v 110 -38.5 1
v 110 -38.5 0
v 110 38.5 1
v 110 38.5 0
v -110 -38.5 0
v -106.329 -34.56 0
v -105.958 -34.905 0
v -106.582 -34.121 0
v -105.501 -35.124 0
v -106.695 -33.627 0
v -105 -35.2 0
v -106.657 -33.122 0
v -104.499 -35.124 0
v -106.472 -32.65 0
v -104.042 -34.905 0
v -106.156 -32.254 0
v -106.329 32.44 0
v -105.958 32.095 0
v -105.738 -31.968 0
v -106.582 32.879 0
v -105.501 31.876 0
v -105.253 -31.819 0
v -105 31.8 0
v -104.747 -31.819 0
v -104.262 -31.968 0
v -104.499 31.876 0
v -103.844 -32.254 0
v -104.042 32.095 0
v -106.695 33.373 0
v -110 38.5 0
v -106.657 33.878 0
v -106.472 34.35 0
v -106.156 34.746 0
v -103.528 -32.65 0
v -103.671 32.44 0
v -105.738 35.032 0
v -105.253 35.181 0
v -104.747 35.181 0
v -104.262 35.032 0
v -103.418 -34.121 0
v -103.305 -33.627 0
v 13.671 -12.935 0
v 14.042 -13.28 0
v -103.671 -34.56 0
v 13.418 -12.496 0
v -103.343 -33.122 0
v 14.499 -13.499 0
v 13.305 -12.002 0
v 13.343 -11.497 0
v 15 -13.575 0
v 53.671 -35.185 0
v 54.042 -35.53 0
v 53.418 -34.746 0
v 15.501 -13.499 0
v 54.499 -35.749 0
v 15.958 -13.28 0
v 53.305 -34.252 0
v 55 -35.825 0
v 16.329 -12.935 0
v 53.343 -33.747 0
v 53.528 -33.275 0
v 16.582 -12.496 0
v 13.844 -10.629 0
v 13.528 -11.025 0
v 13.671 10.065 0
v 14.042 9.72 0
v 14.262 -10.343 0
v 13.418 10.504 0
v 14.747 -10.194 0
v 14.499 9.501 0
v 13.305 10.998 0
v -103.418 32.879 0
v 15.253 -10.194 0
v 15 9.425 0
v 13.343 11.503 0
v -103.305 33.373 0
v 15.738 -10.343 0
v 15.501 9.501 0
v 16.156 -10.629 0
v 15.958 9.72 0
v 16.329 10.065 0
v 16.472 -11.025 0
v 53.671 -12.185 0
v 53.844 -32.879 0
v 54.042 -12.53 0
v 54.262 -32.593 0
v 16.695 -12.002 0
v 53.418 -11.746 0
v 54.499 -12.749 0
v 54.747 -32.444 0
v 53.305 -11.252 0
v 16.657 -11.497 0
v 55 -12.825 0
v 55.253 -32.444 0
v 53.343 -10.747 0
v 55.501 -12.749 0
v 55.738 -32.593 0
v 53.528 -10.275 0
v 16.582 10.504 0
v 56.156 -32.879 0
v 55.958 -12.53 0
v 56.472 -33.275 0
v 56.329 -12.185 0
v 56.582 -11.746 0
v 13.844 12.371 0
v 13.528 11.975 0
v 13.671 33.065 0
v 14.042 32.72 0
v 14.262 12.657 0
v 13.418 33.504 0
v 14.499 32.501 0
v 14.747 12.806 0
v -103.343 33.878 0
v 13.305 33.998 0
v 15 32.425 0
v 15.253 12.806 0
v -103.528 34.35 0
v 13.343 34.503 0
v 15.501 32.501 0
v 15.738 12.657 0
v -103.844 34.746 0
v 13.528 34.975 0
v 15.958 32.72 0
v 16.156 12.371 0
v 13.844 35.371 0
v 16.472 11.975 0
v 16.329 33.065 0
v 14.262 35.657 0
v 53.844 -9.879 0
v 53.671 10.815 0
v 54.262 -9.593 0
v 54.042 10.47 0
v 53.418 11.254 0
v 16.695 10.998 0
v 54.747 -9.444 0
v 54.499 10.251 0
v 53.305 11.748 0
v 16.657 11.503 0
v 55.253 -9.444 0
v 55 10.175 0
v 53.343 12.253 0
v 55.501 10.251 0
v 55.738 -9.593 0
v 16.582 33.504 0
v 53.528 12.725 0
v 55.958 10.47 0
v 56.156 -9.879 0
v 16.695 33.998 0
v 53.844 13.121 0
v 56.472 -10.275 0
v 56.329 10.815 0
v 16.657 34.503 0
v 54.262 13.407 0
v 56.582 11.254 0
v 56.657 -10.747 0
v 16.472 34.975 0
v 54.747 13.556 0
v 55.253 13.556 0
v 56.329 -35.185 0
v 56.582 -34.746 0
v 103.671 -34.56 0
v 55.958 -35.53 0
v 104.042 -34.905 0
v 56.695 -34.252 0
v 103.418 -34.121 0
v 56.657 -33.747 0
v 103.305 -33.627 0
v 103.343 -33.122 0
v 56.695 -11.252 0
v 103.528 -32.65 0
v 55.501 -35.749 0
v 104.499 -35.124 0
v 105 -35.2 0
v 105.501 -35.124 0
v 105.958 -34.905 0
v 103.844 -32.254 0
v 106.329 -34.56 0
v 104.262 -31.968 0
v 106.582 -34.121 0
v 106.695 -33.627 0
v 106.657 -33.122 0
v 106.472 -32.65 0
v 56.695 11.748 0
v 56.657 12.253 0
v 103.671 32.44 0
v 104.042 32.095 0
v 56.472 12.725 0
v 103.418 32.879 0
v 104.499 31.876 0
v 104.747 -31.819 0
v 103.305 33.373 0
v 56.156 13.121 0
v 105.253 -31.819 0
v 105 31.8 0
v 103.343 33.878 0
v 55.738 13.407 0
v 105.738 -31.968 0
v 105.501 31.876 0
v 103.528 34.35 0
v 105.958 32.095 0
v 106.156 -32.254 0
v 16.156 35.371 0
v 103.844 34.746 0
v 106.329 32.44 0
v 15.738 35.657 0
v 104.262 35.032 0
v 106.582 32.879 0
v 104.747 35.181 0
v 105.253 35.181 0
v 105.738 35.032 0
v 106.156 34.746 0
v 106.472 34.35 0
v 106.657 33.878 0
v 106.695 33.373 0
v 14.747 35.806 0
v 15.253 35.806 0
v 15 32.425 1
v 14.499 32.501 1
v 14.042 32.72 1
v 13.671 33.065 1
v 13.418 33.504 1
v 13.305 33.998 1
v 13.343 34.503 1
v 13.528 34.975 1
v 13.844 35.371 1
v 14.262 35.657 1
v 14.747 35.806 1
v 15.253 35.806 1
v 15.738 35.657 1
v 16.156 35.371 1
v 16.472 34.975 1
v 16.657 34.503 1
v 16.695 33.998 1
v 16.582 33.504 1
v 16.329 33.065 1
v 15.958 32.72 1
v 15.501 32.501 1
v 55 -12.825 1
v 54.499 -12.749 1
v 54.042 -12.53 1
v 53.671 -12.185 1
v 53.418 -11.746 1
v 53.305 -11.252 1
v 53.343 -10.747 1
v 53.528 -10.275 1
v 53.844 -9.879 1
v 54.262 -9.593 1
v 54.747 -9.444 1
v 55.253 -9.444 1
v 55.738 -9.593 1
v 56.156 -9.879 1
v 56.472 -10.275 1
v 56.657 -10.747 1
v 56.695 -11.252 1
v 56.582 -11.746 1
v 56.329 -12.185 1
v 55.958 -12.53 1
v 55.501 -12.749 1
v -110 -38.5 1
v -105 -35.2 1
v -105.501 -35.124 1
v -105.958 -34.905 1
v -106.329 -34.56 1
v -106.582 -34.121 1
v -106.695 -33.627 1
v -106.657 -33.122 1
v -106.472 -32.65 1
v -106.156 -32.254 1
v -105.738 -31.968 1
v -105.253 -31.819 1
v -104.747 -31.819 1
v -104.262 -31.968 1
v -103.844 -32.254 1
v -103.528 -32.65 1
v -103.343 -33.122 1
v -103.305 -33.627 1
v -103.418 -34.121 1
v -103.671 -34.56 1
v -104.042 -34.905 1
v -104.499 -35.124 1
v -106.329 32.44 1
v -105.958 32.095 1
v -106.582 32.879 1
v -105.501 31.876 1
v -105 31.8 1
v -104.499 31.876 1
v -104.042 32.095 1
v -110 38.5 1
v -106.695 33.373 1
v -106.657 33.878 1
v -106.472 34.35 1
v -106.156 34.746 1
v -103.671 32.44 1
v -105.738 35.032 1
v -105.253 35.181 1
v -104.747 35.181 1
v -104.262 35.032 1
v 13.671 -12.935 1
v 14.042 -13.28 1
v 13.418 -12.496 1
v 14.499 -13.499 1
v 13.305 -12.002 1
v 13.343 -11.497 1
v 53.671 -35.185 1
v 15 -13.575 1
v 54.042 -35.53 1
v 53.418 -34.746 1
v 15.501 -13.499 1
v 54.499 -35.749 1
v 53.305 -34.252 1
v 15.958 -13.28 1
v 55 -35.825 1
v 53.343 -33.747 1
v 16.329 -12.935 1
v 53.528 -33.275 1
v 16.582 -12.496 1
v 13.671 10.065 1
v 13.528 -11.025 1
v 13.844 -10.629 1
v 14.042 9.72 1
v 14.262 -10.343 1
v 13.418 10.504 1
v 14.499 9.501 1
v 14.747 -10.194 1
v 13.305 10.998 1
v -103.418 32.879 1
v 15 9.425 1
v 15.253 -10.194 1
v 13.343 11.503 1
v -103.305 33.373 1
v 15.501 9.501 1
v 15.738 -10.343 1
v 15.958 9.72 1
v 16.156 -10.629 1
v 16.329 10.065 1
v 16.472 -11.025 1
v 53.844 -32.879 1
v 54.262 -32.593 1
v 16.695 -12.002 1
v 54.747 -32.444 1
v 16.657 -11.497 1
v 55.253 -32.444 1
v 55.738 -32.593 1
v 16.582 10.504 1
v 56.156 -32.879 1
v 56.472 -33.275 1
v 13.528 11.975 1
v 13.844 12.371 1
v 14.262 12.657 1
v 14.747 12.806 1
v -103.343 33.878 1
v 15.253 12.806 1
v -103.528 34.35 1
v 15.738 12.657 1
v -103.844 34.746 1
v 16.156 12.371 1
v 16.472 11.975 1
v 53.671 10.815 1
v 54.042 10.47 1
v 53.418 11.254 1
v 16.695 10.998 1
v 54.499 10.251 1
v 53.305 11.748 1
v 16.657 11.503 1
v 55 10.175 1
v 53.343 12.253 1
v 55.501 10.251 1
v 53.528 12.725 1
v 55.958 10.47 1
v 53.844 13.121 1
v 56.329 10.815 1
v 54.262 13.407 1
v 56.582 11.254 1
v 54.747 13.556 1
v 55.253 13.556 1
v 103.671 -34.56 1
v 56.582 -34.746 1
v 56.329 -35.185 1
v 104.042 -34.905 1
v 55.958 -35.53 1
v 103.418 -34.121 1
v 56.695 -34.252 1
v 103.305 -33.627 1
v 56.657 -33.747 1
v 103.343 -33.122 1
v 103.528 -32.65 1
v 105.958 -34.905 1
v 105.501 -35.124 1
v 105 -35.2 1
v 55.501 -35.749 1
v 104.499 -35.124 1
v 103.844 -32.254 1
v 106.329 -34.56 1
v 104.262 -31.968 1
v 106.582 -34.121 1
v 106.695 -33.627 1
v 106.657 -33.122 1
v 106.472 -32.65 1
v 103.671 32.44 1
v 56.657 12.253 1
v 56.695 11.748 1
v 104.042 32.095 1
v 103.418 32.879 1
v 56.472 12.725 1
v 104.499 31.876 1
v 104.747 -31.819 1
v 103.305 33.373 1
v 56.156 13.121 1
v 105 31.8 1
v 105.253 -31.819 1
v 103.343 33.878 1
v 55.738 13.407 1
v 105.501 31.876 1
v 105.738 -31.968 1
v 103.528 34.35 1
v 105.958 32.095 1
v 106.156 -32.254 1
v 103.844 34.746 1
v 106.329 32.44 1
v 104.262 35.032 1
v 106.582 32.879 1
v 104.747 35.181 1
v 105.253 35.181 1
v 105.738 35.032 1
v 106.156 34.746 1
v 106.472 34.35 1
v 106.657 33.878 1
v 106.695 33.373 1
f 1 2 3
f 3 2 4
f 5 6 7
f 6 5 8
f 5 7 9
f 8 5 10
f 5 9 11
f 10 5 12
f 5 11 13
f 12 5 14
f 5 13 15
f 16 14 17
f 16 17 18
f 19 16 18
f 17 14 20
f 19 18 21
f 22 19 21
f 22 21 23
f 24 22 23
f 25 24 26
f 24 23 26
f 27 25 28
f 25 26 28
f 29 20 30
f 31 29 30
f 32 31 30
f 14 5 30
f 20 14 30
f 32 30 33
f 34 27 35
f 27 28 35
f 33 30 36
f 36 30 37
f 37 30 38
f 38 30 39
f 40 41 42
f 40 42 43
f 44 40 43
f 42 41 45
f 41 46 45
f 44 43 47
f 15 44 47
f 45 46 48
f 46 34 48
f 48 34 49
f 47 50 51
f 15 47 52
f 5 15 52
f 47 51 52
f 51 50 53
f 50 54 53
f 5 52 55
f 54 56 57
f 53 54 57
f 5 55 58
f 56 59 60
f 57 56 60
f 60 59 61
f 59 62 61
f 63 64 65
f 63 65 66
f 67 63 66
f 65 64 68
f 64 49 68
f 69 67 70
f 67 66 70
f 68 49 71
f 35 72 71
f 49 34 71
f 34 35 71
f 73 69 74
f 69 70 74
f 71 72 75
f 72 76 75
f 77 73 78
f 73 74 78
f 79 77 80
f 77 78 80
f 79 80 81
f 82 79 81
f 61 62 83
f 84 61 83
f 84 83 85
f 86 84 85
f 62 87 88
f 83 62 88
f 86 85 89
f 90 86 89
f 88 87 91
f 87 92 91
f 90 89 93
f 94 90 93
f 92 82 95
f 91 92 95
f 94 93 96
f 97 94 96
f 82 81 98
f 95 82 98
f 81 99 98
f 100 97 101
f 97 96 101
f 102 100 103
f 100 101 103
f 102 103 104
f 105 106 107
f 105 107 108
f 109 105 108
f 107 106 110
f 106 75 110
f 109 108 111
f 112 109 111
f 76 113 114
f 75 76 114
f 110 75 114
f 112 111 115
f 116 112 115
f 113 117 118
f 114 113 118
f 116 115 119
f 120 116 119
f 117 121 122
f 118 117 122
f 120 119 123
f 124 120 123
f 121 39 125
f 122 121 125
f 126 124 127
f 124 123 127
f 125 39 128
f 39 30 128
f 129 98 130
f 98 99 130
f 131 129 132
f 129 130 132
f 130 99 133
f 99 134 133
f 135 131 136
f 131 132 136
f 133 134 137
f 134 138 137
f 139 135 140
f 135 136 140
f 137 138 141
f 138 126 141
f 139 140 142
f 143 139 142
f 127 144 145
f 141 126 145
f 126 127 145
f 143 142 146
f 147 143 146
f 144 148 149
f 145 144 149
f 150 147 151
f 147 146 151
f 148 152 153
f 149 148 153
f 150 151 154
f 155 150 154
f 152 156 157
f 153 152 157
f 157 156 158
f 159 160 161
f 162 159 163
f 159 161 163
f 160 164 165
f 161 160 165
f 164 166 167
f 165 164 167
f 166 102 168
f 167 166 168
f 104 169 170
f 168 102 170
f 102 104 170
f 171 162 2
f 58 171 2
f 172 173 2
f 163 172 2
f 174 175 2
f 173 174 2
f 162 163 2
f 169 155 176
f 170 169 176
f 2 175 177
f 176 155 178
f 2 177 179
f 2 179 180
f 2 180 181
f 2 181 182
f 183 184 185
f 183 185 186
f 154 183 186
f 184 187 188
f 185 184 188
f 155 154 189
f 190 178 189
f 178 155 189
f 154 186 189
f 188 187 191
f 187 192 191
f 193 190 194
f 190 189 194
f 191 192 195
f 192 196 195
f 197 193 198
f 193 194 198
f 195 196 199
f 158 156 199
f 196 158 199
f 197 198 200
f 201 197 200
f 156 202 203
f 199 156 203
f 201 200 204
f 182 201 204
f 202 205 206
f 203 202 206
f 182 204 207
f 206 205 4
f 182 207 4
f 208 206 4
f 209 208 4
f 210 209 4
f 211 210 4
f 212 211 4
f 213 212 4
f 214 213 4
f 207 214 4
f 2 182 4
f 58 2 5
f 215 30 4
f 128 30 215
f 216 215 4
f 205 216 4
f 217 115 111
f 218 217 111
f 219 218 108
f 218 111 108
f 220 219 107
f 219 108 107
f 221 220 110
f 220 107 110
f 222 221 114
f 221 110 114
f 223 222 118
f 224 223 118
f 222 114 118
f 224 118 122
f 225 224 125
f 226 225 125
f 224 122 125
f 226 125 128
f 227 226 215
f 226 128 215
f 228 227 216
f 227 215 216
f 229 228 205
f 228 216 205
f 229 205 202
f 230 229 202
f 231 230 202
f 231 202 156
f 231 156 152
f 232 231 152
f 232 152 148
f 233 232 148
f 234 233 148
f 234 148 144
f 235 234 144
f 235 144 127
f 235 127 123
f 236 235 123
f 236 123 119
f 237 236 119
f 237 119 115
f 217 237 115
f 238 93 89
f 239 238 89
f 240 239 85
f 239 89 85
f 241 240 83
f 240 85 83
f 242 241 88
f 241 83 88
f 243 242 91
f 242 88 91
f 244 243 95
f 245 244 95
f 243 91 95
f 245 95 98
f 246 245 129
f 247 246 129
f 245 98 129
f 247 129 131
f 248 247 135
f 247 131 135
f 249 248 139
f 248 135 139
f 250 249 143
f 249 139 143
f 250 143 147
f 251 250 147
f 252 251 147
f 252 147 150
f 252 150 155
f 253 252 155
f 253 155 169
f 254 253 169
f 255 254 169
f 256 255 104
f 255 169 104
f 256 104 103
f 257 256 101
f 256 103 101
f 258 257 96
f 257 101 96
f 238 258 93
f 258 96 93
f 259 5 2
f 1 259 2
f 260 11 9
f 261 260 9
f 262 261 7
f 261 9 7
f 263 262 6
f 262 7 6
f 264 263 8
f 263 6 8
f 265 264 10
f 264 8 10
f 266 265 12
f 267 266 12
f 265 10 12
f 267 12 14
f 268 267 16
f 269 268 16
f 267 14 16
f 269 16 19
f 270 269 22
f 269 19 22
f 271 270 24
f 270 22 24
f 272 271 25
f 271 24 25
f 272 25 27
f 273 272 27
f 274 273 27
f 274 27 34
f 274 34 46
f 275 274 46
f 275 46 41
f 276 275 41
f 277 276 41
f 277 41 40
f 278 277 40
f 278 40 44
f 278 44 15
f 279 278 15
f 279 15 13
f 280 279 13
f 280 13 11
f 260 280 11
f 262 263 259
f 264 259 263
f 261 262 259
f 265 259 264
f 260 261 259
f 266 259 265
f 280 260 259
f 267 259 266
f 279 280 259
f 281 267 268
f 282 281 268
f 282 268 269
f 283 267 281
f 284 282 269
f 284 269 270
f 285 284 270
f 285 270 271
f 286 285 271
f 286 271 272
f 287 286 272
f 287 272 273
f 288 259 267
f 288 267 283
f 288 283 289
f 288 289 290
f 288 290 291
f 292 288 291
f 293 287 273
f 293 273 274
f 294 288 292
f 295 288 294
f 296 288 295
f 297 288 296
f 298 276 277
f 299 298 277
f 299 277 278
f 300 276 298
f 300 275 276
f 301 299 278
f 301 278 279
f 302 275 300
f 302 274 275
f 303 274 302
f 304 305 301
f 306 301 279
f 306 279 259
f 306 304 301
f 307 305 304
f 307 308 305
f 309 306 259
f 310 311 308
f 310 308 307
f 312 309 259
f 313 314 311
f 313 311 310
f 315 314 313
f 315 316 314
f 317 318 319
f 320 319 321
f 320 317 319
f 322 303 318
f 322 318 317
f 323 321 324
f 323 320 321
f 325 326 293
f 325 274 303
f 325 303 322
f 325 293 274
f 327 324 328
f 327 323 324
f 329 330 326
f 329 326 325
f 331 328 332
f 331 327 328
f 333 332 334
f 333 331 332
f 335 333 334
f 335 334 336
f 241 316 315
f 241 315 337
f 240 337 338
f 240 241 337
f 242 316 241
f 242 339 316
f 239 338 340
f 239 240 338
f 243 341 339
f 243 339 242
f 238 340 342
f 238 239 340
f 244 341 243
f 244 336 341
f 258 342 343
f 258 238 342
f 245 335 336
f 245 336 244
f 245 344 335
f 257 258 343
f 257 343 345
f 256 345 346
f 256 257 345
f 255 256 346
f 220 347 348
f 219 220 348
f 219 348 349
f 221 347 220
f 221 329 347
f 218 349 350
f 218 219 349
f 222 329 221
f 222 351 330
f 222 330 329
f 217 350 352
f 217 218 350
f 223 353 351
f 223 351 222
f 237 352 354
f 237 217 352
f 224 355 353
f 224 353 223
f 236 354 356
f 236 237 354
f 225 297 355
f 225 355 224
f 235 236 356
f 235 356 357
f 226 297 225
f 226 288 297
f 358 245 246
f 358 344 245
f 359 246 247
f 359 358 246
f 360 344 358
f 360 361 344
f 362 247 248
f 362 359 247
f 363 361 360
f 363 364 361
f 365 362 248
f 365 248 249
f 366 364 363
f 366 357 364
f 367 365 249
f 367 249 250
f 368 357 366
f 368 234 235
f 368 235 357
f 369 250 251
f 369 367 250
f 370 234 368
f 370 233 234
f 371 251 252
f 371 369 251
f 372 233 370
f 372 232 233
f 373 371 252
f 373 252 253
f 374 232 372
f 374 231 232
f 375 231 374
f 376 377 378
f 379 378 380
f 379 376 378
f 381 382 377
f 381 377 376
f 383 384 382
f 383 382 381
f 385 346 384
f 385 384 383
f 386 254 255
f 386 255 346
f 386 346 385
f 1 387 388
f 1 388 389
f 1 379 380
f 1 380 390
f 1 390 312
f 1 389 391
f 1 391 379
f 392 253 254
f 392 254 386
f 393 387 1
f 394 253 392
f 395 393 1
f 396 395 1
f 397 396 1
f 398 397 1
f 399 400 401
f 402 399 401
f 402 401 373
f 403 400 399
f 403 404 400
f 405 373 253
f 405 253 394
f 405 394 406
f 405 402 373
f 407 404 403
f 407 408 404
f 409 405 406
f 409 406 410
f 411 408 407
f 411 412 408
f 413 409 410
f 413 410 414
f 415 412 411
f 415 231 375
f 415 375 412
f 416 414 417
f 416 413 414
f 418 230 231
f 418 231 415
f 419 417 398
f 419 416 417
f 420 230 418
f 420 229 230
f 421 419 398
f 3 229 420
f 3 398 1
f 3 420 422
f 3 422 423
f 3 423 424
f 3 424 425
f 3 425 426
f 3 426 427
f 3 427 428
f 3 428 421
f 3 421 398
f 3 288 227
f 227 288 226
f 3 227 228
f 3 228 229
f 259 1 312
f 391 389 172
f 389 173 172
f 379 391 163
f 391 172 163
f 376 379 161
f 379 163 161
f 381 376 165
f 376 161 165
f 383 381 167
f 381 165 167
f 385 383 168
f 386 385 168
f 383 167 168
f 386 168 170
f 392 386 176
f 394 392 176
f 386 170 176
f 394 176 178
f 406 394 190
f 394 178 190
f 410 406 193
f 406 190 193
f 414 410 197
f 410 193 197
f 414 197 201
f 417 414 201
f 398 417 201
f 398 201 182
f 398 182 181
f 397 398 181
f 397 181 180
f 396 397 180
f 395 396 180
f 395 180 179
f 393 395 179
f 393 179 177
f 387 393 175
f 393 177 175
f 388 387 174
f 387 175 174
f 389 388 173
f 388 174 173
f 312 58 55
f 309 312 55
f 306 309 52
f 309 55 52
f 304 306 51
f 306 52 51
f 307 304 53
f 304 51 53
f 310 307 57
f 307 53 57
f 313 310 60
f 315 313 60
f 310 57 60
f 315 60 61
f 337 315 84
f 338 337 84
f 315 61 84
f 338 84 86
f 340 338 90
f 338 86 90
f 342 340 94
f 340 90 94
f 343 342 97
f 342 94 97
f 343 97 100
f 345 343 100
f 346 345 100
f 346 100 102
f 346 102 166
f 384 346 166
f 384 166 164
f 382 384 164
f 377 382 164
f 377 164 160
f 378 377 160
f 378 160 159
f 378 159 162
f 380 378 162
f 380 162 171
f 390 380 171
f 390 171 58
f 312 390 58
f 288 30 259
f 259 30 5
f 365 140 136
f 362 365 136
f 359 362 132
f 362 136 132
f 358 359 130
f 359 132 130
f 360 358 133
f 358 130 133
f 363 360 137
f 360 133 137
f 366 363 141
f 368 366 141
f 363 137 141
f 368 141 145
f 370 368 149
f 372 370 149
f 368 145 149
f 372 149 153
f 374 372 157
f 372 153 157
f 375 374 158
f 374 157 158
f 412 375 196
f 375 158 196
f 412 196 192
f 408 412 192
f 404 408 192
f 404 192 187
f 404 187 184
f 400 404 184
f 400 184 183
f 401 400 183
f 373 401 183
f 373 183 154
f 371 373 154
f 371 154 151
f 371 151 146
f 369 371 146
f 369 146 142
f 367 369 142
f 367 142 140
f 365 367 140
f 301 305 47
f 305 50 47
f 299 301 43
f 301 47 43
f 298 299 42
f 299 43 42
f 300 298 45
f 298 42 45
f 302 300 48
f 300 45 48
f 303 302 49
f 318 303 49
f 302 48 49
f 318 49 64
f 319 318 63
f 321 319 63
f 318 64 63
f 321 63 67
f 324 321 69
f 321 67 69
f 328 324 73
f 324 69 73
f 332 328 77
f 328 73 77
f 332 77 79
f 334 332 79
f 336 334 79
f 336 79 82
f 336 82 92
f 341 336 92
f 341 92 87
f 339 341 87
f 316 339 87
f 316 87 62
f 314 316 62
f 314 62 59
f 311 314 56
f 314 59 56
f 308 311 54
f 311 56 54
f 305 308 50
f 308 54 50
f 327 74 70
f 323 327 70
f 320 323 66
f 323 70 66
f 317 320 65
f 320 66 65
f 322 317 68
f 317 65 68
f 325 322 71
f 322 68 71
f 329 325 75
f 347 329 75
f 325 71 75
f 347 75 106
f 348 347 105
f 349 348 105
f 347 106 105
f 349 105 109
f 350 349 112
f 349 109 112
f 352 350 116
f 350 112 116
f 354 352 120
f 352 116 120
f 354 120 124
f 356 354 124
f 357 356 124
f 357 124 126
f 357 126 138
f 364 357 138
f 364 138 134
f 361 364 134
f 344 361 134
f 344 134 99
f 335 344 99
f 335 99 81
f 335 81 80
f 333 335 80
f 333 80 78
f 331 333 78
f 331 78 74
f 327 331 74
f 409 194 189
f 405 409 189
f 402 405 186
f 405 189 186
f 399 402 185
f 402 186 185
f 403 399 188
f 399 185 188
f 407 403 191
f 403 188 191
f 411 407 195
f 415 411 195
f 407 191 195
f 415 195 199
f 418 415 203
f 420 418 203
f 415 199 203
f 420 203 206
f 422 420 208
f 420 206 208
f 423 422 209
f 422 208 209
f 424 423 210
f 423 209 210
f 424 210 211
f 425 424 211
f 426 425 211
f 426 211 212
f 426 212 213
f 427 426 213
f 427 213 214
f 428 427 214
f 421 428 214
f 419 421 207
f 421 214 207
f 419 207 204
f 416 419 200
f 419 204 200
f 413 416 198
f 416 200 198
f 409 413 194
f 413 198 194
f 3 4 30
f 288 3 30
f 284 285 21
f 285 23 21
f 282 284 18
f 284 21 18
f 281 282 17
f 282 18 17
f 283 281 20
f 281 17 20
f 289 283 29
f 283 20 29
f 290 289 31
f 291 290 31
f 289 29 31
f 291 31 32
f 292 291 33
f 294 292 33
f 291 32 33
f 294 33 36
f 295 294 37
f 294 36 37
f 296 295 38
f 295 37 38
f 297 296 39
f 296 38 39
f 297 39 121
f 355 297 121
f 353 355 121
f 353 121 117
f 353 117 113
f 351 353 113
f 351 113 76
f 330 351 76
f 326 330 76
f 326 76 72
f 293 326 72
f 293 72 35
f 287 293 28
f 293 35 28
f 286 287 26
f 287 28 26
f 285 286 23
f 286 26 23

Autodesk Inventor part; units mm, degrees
ref_plane "YZ Plane" through (0, 0, 0) normal (1, 0, 0) x (0, 1, 0)
ref_plane "XZ Plane" through (0, 0, 0) normal (0, 1, 0) x (-1, 0, 0)
ref_plane "XY Plane" through (0, 0, 0) normal (0, 0, 1) x (1, 0, 0)
sketch "スケッチ1" plane through (0, 0, 0) normal (0, 0, 1) x (1, 0, 0)
  line L0 (-110, -38.5) -> (110, -38.5)
  line L1 (110, -38.5) -> (110, 38.5)
  line L2 (110, 38.5) -> (-110, 38.5)
  line L3 (-110, 38.5) -> (-110, -38.5)
  line L4 (-110, -38.5) -> (110, 38.5) construction
  line L5 (110, -38.5) -> (-110, 38.5) construction
  point P0 (0, 0)
  dimension "d0" = 220
  dimension "d1" = 77
extrude "プレート1" add sketch "スケッチ1" along normal blind 1
sketch "スケッチ2" plane through (0, 0, 1) normal (0, 0, 1) x (1, 0, 0)
  line L0 (-110, -38.5) -> (-110, 38.5) projected
  line L1 (110, -38.5) -> (-110, -38.5) projected
  line L2 (110, 38.5) -> (110, -38.5) projected
  line L3 (-110, 38.5) -> (110, 38.5) projected
  line L4 (105, 33.5) -> (105, -33.5)
  line L5 (105, -33.5) -> (-105, -33.5)
  line L6 (-105, -33.5) -> (-105, 33.5)
  line L7 (-105, 33.5) -> (105, 33.5)
  point P0 (0, 0)
  dimension "d3" = 5
hole "穴1" at (-105, 33.5, 1) at (-105, -33.5, 1) at (105, -33.5, 1) at (105, 33.5, 1) direction (0, 0, -1) diameter 3.4 depth 1 clearance for "Flat Head Machine Screw" size "M3" standard "Ansi Metric M Profile"
sketch "スケッチ3" plane through (0, 0, 1) normal (0, 0, 1) x (1, 0, 0)
  line L0 (55, -34.125) -> (15, -34.125)
  line L1 (15, -34.125) -> (15, -11.875)
  line L2 (15, -11.875) -> (55, -11.875)
  line L3 (55, -11.875) -> (55, -34.125)
  line L4 (55, -34.125) -> (15, -11.875) construction
  line L5 (15, -34.125) -> (55, -11.875) construction
  line L6 (15, 11.125) -> (55, 11.125)
  line L7 (55, 11.125) -> (55, -11.125)
  line L8 (55, -11.125) -> (15, -11.125)
  line L9 (15, -11.125) -> (15, 11.125)
  line L10 (15, 11.125) -> (55, -11.125) construction
  line L11 (55, 11.125) -> (15, -11.125) construction
  line L12 (15, 11.875) -> (55, 11.875)
  line L13 (55, 11.875) -> (55, 34.125)
  line L14 (55, 34.125) -> (15, 34.125)
  line L15 (15, 34.125) -> (15, 11.875)
  line L16 (15, 11.875) -> (55, 34.125) construction
  line L17 (55, 11.875) -> (15, 34.125) construction
  point P0 (0, 0)
  point P1 (35, -23)
  point P2 (35, 0)
  point P3 (35, 0)
  point P4 (35, 23)
  point P5 (35, 23)
  point P6 (35, 0)
  point P7 (35, -23)
  dimension "d11" = 22.25
  dimension "d12" = 40
  dimension "d13" = 40
  dimension "d14" = 22.25
  dimension "d15" = 40
  dimension "d16" = 22.25
  dimension "d17" = 23
  dimension "d18" = 23
  dimension "d20" = 35
hole "穴2" at (15, 34.125, 1) at (55, 11.875, 1) at (15, 11.125, 1) at (55, -11.125, 1) at (15, -11.875, 1) at (55, -34.125, 1) direction (0, 0, -1) diameter 3.4 end through all clearance for "Flat Head Machine Screw" size "M3" standard "Ansi Metric M Profile"
equation "\"d9\" = Thickness"
equation "\"d26\" = Thickness"
equation "\"d2\" = Thickness"
equation "\"BendRadius\" = Thickness"
equation "\"BendReliefWidth\" = Thickness"
equation "\"BendReliefDepth\" = 0.5 * Thickness"
equation "\"CornerReliefSize\" = 4 * Thickness"
equation "\"MinimumRemnant\" = 2 * Thickness"
equation "\"TransitionRadius\" = BendRadius"
equation "\"JacobiRadiusSize\" = Thickness"
equation "\"GapSize\" = Thickness"
equation "\"Thickness\" = 1"
properties part number "plate3" material "CFRP"
